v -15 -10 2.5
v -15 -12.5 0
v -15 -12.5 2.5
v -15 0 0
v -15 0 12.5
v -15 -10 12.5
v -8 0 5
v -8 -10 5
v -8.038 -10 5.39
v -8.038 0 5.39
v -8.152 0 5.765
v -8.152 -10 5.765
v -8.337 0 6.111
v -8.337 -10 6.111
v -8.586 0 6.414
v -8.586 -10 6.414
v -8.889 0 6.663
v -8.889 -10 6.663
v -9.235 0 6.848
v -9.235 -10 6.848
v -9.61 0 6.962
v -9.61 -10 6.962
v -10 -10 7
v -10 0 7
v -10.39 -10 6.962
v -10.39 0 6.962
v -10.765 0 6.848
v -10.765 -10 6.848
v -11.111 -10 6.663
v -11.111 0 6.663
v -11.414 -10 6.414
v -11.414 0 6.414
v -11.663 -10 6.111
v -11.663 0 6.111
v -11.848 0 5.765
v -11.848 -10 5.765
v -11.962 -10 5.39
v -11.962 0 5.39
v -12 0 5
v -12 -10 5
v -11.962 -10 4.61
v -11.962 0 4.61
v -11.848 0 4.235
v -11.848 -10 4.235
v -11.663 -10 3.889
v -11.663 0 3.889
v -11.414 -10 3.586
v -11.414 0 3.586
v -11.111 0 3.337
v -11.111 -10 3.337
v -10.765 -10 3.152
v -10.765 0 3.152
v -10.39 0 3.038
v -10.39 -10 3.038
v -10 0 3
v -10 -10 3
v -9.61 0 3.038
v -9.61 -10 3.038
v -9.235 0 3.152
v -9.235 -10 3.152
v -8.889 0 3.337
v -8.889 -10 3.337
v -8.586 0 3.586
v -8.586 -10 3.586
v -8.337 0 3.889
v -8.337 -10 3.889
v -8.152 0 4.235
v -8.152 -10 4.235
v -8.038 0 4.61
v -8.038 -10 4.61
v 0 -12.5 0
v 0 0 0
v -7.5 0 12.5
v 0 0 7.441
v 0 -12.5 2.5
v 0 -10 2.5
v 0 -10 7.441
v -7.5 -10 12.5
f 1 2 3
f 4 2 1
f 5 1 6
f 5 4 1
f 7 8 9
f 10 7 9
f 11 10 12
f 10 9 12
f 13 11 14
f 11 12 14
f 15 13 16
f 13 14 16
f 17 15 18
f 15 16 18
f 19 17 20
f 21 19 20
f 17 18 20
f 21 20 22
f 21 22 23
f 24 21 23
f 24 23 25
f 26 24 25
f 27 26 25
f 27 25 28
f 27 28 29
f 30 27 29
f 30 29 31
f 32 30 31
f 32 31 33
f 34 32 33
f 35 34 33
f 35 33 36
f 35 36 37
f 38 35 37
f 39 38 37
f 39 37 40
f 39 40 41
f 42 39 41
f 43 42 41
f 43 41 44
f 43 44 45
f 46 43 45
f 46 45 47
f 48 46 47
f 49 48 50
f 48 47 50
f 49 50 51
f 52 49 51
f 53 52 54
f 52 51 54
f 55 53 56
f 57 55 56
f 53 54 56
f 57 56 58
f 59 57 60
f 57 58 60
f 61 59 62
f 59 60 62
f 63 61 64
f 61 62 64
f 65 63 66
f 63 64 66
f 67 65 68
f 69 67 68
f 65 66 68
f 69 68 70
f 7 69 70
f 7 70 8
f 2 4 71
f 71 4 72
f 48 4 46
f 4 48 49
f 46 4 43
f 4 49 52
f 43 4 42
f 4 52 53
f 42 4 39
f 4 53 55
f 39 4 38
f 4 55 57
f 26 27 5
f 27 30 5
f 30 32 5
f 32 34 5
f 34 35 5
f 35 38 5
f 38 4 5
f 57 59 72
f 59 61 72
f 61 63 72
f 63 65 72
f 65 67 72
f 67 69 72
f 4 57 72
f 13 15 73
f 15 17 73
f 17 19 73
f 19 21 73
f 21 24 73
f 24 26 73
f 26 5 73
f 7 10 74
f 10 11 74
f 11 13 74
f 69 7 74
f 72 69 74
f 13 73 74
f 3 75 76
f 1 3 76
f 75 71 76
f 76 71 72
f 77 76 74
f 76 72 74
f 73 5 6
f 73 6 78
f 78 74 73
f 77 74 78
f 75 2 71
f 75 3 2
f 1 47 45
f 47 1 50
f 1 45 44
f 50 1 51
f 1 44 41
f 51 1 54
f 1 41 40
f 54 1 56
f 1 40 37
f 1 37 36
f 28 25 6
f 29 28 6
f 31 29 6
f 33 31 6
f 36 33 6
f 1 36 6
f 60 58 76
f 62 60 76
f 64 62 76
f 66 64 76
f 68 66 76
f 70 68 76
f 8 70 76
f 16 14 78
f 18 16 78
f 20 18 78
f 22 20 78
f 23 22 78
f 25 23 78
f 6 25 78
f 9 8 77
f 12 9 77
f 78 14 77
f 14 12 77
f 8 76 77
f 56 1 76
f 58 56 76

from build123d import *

# Parameters (mm, degrees)
F0_W     = 15
F0_H     = 12.5
F1_DEPTH = 12.5
F2_SIZE2 = 5.0588138763
F2_SIZE  = 7.5
F3_W     = 2.5
F3_H     = 10
F4_DEPTH = 15.001
F5_R     = 2
F6_DEPTH = 10.001


with BuildPart() as f1:
    # F0 (on Front) → F1 (new body)
    with BuildSketch(Plane.XZ):
        with Locations((-7.5, 6.25)):
            Rectangle(F0_W, F0_H)
    extrude(amount=F1_DEPTH)

    # F2
    f2_edges = [f1.edges().sort_by_distance(p)[0] for p in [
        (0, -6.25, 12.5),
    ]]
    f2_side = f1.faces().sort_by_distance((-7.5, -6.25, 12.5))[0]
    chamfer(f2_edges, length=F2_SIZE, length2=F2_SIZE2, reference=f2_side)

    # F3 (on face) → F4 (cut, through all)
    with BuildSketch(Plane.YZ):
        with Locations((-11.25, 7.5)):
            Rectangle(F3_W, F3_H)
    extrude(amount=-F4_DEPTH, mode=Mode.SUBTRACT)

    # F5 (on face) → F6 (cut, through all)
    with BuildSketch(Plane.XZ.offset(10)):
        with Locations((-10, 5)):
            Circle(F5_R)
    extrude(amount=-F6_DEPTH, mode=Mode.SUBTRACT)


solid = f1.part
